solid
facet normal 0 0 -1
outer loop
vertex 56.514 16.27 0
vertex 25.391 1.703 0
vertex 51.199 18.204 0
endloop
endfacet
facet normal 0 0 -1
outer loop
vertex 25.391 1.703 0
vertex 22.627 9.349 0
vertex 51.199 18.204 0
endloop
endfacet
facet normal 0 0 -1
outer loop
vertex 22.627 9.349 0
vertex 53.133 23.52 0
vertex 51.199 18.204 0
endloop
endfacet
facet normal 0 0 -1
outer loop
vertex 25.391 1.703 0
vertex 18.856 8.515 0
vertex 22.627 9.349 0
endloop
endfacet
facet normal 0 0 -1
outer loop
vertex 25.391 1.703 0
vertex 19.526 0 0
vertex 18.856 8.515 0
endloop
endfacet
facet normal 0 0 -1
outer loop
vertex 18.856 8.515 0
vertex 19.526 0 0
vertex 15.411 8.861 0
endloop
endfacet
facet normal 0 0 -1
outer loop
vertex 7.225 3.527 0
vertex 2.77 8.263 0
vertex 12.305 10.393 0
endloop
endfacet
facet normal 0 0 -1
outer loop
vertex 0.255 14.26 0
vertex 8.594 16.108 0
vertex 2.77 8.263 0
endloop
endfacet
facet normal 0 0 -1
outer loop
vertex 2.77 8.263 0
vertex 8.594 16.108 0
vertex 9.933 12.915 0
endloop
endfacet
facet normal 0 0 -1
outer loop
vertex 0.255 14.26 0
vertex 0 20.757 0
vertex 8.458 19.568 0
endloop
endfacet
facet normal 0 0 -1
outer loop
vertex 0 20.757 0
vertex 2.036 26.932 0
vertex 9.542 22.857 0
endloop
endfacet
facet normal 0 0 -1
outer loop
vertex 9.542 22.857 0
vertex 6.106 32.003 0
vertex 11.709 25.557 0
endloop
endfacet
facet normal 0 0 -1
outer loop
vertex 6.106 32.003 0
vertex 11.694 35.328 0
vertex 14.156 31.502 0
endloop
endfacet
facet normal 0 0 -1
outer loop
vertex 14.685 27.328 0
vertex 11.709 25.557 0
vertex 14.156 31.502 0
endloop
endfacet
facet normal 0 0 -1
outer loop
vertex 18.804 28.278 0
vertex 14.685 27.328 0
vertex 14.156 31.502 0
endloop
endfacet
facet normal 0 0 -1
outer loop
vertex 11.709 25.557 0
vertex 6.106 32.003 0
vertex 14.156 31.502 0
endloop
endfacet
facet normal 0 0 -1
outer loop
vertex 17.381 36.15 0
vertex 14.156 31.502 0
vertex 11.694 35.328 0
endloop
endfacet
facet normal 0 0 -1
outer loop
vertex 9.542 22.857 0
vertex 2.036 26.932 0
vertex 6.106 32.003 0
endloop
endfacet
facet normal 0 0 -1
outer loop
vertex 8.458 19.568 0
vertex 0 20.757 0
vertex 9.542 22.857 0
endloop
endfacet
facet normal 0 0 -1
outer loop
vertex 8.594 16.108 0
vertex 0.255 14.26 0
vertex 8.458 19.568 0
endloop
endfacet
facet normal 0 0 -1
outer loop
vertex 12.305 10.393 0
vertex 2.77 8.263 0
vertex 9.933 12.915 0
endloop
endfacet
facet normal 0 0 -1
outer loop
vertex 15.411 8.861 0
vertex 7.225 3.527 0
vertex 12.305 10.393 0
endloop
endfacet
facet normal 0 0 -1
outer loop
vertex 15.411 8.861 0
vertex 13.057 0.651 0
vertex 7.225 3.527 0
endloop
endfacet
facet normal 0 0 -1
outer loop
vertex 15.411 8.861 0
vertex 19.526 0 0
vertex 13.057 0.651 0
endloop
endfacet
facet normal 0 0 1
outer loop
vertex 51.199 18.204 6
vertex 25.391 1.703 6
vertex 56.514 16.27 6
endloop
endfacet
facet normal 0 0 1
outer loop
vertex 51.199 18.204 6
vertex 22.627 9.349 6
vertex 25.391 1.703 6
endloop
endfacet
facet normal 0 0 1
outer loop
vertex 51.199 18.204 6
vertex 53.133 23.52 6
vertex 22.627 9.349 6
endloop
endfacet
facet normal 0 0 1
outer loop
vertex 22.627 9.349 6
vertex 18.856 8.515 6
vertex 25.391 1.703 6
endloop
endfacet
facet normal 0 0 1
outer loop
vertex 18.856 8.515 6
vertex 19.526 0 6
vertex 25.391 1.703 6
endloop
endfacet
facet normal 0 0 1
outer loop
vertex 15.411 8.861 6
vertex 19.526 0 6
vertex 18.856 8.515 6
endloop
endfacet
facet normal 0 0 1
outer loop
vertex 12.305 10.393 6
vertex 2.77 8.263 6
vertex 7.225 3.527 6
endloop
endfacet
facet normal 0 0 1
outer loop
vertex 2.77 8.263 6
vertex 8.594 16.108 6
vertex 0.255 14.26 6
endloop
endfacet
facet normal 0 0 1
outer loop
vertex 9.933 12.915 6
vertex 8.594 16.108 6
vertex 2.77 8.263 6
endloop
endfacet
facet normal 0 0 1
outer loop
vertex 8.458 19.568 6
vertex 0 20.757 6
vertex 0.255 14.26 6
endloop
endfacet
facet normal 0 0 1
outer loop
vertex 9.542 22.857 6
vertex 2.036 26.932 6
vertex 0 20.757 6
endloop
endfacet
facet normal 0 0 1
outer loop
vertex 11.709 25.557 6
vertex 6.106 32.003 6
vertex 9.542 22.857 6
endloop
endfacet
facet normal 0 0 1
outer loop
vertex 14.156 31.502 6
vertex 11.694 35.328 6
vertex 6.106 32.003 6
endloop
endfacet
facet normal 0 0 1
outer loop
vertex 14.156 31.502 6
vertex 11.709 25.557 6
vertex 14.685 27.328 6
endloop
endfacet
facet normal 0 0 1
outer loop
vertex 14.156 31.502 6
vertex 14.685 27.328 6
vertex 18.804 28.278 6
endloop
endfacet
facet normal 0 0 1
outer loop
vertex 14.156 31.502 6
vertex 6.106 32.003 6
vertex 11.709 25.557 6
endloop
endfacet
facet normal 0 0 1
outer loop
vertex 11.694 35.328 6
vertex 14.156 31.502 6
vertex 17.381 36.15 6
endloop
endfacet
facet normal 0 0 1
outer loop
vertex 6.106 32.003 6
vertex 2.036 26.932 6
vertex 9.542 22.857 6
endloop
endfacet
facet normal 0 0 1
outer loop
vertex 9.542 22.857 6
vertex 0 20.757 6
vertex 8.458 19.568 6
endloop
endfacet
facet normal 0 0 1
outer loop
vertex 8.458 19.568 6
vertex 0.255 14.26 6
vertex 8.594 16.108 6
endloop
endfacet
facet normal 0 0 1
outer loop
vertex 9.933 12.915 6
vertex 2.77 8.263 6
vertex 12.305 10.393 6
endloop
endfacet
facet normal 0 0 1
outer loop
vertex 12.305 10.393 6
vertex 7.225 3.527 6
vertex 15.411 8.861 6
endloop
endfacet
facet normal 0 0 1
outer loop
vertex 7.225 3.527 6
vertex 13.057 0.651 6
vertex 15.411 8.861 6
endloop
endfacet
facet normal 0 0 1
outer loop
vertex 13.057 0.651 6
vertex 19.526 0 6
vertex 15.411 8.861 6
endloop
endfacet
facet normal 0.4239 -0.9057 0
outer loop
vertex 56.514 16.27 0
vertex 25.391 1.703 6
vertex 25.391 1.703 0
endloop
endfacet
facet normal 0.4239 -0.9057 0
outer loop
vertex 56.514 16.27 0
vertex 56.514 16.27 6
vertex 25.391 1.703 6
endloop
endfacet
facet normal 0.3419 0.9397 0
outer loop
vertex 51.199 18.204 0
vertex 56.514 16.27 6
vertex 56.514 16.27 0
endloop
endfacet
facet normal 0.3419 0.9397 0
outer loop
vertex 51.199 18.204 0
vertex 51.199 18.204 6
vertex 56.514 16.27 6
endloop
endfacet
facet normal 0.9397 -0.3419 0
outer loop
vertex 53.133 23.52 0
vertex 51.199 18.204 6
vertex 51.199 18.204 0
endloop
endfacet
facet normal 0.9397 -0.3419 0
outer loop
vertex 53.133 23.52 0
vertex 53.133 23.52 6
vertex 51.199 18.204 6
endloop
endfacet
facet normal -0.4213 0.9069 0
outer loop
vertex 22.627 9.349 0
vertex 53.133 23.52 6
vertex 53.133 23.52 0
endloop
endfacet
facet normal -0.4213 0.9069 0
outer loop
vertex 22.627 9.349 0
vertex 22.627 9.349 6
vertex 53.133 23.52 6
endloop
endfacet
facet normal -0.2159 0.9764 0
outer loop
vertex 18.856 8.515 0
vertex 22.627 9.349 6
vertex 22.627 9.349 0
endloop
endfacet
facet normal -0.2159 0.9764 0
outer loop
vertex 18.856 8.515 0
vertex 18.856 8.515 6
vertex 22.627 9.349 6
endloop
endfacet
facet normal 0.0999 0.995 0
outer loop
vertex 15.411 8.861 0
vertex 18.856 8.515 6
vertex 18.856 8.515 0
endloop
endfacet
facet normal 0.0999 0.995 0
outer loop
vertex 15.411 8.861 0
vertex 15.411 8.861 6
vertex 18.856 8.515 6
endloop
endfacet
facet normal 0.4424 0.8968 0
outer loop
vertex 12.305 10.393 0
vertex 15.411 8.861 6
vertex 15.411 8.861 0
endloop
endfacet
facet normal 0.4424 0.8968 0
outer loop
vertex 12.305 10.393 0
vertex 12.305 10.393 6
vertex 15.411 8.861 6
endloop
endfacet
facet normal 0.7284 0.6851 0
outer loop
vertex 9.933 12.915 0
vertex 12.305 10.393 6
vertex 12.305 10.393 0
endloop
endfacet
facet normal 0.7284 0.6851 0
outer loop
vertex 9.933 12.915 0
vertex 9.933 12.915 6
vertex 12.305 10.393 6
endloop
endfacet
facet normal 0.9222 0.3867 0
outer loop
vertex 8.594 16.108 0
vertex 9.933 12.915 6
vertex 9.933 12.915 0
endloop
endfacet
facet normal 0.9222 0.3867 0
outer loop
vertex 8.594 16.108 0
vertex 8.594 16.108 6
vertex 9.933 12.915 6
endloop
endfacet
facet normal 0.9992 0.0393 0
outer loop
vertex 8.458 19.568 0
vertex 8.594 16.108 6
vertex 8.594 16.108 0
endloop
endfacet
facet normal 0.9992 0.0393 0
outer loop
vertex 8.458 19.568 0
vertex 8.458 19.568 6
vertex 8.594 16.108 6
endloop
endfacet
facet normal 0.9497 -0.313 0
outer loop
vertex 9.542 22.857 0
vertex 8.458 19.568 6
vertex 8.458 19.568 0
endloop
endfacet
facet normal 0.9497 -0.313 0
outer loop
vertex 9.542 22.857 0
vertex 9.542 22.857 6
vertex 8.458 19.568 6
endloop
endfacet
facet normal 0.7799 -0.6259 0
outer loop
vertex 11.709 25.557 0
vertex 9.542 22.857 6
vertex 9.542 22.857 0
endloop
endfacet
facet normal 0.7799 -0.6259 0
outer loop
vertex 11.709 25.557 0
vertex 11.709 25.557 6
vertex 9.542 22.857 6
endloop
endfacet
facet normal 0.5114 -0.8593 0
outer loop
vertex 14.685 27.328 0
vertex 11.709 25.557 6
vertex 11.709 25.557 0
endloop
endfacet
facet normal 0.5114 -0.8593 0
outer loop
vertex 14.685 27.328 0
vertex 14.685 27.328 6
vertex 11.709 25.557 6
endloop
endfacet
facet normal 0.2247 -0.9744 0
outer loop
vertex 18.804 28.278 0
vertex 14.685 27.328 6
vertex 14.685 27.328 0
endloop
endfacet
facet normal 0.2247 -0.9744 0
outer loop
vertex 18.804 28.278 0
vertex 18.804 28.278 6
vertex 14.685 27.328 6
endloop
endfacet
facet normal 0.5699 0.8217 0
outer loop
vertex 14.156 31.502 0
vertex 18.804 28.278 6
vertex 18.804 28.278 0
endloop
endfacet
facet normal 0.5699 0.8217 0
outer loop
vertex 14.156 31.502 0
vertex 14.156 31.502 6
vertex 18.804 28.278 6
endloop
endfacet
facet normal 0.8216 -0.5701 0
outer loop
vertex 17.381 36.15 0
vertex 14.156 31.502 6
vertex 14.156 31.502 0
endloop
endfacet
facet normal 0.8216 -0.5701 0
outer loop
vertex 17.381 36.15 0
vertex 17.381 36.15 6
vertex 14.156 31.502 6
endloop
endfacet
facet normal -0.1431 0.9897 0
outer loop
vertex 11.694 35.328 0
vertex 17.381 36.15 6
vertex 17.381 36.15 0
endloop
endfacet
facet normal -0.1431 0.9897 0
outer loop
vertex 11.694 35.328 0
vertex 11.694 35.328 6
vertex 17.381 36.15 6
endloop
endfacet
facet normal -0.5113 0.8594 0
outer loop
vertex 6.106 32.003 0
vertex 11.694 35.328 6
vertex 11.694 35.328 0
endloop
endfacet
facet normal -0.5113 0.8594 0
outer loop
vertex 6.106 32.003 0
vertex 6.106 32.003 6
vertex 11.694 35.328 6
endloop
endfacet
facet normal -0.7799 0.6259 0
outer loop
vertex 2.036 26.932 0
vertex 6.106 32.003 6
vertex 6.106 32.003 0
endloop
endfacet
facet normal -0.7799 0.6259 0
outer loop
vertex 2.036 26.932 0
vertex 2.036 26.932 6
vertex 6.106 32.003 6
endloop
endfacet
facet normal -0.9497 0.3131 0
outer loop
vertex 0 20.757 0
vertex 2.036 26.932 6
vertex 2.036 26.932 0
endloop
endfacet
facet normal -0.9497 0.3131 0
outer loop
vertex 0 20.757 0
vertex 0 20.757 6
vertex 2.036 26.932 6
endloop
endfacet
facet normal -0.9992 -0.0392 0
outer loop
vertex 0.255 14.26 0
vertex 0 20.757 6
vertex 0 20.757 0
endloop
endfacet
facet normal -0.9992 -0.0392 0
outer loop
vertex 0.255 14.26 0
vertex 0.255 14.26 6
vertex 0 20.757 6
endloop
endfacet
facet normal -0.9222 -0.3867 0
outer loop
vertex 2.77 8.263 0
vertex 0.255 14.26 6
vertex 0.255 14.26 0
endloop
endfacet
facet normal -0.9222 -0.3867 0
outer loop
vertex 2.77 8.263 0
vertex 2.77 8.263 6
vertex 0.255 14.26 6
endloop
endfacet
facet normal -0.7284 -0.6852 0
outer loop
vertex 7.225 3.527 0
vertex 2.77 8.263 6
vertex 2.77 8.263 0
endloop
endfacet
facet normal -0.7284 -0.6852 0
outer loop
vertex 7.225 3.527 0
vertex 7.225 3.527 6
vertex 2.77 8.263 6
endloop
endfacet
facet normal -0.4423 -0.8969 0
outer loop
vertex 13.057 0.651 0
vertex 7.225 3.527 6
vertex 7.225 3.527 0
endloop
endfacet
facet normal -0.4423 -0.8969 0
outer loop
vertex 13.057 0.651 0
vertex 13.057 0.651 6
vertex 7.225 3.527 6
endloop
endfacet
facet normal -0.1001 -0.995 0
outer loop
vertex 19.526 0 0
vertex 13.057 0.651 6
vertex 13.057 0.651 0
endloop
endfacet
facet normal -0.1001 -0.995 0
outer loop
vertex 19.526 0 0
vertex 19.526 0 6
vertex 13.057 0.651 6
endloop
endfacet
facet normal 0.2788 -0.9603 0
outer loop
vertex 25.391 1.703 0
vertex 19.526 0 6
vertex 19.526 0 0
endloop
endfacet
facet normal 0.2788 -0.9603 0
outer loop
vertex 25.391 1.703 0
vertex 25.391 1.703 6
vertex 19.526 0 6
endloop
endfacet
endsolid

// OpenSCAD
$fn = 32;

// ----------------------------------------------------------------------
// Hook plate: curl radius 14 mm over 205 degrees, 8 mm thick band
// ----------------------------------------------------------------------

// --- parameters (mm) ---
profile_height = 6;       // extrusion height
profile_points = 26;      // points of the closed outline

profile = [[14.156, 31.502], [17.381, 36.15], [11.694, 35.328], [6.106, 32.003], [2.036, 26.932], [0, 20.757], [0.255, 14.26], [2.77, 8.263], [7.225, 3.527], [13.057, 0.651], [19.526, 0], [25.391, 1.703], [56.514, 16.27], [51.199, 18.204], [53.133, 23.52], [22.627, 9.349], [18.856, 8.515], [15.411, 8.861], [12.305, 10.393], [9.933, 12.915], [8.594, 16.108], [8.458, 19.568], [9.542, 22.857], [11.709, 25.557], [14.685, 27.328], [18.804, 28.278]];  // single closed polygon, 26 points, counter clockwise

// --- the one profile operation ---
linear_extrude(height = profile_height) polygon(points = profile);
